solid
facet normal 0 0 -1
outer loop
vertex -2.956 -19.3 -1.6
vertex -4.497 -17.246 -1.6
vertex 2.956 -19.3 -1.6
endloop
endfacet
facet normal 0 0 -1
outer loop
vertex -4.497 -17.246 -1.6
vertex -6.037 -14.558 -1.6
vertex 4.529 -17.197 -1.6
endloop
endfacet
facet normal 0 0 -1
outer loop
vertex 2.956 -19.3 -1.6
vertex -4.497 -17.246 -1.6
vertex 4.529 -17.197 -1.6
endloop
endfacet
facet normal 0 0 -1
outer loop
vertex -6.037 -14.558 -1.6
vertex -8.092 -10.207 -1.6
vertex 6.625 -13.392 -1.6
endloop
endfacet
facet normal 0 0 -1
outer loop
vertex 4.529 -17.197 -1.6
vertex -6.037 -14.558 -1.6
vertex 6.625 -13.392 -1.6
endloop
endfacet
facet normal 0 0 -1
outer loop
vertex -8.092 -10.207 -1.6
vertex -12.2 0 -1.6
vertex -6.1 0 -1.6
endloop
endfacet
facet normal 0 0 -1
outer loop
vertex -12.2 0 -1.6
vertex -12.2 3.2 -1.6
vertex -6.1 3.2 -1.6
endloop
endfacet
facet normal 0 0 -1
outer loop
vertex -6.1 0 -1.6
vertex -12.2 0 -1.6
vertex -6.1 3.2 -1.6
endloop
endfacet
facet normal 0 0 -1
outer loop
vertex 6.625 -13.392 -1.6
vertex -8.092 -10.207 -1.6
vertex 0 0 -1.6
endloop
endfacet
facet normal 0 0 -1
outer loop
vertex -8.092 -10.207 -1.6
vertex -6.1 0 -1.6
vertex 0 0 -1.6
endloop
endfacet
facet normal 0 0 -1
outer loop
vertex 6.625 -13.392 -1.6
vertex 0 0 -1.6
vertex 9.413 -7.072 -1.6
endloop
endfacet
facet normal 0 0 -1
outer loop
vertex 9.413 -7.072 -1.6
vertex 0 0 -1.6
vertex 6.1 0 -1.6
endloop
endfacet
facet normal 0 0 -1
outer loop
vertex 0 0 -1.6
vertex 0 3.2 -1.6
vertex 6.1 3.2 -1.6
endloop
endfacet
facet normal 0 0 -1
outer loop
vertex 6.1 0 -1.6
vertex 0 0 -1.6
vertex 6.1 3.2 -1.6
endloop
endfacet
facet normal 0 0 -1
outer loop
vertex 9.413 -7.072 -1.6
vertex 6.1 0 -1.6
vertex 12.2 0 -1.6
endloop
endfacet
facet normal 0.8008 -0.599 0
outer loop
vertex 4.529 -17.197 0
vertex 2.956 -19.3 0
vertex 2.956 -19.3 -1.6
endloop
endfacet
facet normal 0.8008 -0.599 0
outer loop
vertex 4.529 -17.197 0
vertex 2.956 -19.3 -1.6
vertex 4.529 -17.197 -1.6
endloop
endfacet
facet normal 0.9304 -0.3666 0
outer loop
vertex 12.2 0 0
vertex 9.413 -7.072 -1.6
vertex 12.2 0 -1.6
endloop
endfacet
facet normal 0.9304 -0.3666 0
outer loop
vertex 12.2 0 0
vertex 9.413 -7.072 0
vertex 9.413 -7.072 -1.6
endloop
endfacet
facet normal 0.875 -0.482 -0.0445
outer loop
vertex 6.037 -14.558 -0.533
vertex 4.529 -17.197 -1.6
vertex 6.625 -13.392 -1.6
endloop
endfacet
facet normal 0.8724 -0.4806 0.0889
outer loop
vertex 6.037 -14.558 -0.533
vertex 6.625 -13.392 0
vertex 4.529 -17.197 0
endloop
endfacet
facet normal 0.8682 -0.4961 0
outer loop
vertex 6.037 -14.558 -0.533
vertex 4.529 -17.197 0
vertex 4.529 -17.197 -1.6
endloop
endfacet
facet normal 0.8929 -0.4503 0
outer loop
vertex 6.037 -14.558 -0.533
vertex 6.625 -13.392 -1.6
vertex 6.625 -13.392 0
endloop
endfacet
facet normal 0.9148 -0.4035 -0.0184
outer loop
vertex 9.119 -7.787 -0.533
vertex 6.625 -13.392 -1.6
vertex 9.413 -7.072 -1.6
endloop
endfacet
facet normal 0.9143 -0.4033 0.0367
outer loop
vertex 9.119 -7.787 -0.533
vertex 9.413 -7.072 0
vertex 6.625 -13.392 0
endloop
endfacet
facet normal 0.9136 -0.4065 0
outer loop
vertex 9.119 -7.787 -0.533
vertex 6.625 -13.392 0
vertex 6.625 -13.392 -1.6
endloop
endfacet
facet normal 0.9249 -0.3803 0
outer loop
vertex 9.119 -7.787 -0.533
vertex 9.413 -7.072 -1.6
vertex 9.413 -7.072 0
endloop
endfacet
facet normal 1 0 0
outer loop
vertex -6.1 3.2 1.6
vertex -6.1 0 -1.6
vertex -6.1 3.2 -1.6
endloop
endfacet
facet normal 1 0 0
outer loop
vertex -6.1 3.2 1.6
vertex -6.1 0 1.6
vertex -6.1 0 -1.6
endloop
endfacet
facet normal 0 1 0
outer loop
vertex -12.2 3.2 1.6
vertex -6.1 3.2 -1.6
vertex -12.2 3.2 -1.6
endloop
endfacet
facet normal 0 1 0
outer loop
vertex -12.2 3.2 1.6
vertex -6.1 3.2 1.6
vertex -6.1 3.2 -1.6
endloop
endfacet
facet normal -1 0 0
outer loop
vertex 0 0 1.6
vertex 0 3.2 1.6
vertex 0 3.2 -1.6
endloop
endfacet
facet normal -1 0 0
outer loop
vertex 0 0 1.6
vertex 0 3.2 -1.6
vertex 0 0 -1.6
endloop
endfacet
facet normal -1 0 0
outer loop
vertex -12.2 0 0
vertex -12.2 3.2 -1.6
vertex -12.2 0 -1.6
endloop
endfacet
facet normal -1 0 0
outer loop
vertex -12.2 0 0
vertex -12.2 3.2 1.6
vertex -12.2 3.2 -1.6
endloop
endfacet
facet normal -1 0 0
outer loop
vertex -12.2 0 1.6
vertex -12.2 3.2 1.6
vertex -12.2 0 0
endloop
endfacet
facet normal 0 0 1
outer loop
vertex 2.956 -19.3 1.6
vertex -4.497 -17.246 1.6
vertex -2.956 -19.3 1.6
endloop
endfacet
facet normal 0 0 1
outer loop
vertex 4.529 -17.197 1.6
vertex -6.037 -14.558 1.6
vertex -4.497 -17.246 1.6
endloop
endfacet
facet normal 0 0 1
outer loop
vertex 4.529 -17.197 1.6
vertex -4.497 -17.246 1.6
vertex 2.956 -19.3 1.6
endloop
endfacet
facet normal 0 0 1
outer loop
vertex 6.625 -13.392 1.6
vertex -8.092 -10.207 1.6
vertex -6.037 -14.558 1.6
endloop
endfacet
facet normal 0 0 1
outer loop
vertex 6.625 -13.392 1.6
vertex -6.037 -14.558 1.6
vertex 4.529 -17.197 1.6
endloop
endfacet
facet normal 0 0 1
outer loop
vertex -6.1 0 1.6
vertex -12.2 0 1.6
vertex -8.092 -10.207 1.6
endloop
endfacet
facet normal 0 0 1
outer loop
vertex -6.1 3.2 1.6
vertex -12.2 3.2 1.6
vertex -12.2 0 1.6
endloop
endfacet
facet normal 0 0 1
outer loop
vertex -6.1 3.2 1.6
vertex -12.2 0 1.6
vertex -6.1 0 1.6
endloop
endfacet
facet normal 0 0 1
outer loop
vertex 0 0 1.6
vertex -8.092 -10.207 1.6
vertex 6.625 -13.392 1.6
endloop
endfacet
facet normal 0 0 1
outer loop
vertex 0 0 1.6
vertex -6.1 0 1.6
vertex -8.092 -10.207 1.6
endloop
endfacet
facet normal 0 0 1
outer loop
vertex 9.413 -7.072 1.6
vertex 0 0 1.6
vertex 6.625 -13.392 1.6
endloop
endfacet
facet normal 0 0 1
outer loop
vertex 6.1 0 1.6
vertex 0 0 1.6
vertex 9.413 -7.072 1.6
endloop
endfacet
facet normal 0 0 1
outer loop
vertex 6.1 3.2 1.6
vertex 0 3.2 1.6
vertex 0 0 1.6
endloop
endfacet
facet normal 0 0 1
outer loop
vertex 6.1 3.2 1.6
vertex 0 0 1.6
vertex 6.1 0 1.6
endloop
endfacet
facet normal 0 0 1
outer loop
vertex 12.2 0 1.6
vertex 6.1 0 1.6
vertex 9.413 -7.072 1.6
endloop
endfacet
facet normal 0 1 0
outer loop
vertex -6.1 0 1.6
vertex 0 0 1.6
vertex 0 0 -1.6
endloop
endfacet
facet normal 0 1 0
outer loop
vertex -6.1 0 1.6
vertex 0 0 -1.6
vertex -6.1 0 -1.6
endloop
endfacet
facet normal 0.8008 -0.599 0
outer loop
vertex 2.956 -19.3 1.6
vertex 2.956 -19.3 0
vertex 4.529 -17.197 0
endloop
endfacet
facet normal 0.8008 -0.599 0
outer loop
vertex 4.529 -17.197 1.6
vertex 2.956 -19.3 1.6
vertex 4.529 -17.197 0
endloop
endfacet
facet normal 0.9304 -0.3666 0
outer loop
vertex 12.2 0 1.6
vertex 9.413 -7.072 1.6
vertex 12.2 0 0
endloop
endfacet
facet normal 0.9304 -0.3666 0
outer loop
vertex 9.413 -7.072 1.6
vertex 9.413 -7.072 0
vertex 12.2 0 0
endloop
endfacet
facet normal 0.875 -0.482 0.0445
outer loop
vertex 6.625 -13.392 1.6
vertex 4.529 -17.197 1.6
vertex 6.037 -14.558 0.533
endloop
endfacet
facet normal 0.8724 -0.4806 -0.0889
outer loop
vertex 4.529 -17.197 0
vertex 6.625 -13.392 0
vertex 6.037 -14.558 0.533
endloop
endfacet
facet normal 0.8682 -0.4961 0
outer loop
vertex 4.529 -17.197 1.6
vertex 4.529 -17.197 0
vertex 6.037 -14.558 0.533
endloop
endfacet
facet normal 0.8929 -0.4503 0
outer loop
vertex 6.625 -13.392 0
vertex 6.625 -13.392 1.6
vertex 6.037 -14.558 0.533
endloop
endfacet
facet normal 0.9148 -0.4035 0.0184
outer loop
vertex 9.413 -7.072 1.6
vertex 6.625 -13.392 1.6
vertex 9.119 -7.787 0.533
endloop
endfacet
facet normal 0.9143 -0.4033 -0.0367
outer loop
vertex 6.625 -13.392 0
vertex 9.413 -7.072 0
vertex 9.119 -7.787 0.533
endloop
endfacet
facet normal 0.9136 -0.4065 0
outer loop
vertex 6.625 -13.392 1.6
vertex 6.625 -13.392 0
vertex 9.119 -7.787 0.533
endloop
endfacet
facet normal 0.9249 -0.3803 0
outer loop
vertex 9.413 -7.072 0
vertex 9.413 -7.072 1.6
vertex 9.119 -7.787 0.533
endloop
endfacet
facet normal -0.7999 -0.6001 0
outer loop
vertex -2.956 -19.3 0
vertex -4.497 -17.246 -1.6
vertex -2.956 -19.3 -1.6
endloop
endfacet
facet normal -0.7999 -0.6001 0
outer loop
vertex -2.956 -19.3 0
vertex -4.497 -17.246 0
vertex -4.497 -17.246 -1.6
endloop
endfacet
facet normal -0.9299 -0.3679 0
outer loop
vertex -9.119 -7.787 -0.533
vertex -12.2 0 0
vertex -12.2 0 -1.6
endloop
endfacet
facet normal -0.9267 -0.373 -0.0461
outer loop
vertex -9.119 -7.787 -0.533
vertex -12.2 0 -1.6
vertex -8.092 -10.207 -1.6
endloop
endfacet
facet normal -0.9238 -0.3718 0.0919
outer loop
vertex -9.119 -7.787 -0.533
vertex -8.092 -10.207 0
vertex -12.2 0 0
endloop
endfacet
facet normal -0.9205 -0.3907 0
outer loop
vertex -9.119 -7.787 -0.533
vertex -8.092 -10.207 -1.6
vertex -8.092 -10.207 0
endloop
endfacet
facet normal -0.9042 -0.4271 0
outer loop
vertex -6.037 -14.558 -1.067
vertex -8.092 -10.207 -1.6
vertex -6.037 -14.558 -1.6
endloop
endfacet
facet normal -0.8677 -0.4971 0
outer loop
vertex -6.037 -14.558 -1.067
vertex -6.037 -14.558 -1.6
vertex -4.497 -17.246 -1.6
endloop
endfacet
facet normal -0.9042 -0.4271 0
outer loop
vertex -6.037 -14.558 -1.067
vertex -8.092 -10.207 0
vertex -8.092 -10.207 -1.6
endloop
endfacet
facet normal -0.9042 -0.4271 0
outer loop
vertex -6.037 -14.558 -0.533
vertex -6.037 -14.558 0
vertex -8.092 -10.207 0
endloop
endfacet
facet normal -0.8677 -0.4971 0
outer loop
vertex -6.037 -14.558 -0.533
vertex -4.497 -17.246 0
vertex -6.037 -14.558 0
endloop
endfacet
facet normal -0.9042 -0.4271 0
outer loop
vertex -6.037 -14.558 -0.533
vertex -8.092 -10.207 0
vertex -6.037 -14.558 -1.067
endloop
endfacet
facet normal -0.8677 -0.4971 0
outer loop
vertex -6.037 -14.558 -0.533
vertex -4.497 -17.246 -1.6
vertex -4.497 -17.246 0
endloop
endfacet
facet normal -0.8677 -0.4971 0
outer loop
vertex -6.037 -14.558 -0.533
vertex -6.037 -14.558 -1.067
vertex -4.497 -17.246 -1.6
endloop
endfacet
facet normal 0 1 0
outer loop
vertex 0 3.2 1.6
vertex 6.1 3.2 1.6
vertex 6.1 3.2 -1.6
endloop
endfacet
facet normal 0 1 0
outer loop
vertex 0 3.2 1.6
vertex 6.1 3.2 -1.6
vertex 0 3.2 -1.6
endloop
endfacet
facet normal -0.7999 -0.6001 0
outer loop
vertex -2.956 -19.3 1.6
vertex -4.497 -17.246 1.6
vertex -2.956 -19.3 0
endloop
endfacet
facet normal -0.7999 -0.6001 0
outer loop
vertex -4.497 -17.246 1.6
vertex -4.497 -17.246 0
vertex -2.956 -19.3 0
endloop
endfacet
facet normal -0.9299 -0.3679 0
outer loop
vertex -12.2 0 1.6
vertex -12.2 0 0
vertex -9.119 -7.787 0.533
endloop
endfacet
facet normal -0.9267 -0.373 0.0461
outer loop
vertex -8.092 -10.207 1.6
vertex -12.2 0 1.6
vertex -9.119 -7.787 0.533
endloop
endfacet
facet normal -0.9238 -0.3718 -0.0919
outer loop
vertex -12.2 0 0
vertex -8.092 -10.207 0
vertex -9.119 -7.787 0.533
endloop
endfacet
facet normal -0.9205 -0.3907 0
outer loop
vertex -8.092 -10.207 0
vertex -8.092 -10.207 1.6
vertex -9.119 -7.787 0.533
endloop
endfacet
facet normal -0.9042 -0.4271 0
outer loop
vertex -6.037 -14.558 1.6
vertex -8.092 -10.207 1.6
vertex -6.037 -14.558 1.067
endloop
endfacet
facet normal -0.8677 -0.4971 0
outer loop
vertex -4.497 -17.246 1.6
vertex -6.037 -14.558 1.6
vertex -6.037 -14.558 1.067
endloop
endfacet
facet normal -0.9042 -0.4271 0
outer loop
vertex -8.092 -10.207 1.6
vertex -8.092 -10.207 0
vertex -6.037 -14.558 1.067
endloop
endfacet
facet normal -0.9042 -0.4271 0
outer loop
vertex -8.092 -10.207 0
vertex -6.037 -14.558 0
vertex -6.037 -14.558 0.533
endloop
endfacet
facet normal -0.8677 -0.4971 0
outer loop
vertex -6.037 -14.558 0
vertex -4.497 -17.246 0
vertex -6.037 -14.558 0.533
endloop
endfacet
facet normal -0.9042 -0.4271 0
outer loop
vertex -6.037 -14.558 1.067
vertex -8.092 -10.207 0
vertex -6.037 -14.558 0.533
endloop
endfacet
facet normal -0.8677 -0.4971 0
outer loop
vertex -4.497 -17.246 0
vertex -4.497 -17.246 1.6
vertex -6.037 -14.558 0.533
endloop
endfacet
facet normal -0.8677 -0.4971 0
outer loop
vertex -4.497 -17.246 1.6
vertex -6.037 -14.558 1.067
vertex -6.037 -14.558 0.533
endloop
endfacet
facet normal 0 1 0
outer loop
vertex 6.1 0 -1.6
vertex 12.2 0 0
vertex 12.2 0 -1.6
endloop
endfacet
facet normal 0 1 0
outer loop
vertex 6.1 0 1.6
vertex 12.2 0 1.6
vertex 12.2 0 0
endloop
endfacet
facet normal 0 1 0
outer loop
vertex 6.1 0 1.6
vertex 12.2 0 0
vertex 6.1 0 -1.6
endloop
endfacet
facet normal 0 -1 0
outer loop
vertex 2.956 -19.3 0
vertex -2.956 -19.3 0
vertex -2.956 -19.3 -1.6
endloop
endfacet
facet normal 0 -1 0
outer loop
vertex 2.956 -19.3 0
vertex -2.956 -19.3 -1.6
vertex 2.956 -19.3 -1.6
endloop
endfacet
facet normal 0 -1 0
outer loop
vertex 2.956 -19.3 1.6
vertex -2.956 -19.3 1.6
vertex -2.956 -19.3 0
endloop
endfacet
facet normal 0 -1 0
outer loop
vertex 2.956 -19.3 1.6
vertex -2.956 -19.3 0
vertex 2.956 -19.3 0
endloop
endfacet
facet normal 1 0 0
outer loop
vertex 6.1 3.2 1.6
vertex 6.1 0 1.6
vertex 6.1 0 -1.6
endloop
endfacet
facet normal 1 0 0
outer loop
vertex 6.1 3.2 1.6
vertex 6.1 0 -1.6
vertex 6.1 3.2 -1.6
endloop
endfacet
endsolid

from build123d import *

# Parameters (mm, degrees)
F1_DEPTH = 1.6


with BuildPart() as f1:
    # F0 (on Top) → F1 (new body, symmetric)
    with BuildSketch(Plane.XY):
        with BuildLine():
            Line((-12.2, 3.2), (-12.2, 0))
            add(Edge.make_bspline(
                [(-12.2, 0), (-9.118693519, -7.9558323076), (-6.0373870379, -15.9116646152), (-2.9560805569, -19.3)],
                knots=[0, 0, 0, 0, 0.3788491575, 0.3788491575, 0.3788491575, 0.3788491575], degree=3))
            Line((-2.9560805569, -19.3), (2.9560805569, -19.3))
            add(Edge.make_bspline(
                [(2.9560805569, -19.3), (6.0373870379, -15.9116646152), (9.118693519, -7.9558323076), (12.2, 0)],
                knots=[0.6211508425, 0.6211508425, 0.6211508425, 0.6211508425, 1, 1, 1, 1], degree=3))
            Line((12.2, 0), (6.1, 0))
            Line((6.1, 0), (6.1, 3.2))
            Line((6.1, 3.2), (0, 3.2))
            Line((0, 3.2), (0, 0))
            Line((0, 0), (-6.1, 0))
            Line((-6.1, 0), (-6.1, 3.2))
            Line((-6.1, 3.2), (-12.2, 3.2))
        make_face()
    extrude(amount=F1_DEPTH, both=True)


solid = f1.part
